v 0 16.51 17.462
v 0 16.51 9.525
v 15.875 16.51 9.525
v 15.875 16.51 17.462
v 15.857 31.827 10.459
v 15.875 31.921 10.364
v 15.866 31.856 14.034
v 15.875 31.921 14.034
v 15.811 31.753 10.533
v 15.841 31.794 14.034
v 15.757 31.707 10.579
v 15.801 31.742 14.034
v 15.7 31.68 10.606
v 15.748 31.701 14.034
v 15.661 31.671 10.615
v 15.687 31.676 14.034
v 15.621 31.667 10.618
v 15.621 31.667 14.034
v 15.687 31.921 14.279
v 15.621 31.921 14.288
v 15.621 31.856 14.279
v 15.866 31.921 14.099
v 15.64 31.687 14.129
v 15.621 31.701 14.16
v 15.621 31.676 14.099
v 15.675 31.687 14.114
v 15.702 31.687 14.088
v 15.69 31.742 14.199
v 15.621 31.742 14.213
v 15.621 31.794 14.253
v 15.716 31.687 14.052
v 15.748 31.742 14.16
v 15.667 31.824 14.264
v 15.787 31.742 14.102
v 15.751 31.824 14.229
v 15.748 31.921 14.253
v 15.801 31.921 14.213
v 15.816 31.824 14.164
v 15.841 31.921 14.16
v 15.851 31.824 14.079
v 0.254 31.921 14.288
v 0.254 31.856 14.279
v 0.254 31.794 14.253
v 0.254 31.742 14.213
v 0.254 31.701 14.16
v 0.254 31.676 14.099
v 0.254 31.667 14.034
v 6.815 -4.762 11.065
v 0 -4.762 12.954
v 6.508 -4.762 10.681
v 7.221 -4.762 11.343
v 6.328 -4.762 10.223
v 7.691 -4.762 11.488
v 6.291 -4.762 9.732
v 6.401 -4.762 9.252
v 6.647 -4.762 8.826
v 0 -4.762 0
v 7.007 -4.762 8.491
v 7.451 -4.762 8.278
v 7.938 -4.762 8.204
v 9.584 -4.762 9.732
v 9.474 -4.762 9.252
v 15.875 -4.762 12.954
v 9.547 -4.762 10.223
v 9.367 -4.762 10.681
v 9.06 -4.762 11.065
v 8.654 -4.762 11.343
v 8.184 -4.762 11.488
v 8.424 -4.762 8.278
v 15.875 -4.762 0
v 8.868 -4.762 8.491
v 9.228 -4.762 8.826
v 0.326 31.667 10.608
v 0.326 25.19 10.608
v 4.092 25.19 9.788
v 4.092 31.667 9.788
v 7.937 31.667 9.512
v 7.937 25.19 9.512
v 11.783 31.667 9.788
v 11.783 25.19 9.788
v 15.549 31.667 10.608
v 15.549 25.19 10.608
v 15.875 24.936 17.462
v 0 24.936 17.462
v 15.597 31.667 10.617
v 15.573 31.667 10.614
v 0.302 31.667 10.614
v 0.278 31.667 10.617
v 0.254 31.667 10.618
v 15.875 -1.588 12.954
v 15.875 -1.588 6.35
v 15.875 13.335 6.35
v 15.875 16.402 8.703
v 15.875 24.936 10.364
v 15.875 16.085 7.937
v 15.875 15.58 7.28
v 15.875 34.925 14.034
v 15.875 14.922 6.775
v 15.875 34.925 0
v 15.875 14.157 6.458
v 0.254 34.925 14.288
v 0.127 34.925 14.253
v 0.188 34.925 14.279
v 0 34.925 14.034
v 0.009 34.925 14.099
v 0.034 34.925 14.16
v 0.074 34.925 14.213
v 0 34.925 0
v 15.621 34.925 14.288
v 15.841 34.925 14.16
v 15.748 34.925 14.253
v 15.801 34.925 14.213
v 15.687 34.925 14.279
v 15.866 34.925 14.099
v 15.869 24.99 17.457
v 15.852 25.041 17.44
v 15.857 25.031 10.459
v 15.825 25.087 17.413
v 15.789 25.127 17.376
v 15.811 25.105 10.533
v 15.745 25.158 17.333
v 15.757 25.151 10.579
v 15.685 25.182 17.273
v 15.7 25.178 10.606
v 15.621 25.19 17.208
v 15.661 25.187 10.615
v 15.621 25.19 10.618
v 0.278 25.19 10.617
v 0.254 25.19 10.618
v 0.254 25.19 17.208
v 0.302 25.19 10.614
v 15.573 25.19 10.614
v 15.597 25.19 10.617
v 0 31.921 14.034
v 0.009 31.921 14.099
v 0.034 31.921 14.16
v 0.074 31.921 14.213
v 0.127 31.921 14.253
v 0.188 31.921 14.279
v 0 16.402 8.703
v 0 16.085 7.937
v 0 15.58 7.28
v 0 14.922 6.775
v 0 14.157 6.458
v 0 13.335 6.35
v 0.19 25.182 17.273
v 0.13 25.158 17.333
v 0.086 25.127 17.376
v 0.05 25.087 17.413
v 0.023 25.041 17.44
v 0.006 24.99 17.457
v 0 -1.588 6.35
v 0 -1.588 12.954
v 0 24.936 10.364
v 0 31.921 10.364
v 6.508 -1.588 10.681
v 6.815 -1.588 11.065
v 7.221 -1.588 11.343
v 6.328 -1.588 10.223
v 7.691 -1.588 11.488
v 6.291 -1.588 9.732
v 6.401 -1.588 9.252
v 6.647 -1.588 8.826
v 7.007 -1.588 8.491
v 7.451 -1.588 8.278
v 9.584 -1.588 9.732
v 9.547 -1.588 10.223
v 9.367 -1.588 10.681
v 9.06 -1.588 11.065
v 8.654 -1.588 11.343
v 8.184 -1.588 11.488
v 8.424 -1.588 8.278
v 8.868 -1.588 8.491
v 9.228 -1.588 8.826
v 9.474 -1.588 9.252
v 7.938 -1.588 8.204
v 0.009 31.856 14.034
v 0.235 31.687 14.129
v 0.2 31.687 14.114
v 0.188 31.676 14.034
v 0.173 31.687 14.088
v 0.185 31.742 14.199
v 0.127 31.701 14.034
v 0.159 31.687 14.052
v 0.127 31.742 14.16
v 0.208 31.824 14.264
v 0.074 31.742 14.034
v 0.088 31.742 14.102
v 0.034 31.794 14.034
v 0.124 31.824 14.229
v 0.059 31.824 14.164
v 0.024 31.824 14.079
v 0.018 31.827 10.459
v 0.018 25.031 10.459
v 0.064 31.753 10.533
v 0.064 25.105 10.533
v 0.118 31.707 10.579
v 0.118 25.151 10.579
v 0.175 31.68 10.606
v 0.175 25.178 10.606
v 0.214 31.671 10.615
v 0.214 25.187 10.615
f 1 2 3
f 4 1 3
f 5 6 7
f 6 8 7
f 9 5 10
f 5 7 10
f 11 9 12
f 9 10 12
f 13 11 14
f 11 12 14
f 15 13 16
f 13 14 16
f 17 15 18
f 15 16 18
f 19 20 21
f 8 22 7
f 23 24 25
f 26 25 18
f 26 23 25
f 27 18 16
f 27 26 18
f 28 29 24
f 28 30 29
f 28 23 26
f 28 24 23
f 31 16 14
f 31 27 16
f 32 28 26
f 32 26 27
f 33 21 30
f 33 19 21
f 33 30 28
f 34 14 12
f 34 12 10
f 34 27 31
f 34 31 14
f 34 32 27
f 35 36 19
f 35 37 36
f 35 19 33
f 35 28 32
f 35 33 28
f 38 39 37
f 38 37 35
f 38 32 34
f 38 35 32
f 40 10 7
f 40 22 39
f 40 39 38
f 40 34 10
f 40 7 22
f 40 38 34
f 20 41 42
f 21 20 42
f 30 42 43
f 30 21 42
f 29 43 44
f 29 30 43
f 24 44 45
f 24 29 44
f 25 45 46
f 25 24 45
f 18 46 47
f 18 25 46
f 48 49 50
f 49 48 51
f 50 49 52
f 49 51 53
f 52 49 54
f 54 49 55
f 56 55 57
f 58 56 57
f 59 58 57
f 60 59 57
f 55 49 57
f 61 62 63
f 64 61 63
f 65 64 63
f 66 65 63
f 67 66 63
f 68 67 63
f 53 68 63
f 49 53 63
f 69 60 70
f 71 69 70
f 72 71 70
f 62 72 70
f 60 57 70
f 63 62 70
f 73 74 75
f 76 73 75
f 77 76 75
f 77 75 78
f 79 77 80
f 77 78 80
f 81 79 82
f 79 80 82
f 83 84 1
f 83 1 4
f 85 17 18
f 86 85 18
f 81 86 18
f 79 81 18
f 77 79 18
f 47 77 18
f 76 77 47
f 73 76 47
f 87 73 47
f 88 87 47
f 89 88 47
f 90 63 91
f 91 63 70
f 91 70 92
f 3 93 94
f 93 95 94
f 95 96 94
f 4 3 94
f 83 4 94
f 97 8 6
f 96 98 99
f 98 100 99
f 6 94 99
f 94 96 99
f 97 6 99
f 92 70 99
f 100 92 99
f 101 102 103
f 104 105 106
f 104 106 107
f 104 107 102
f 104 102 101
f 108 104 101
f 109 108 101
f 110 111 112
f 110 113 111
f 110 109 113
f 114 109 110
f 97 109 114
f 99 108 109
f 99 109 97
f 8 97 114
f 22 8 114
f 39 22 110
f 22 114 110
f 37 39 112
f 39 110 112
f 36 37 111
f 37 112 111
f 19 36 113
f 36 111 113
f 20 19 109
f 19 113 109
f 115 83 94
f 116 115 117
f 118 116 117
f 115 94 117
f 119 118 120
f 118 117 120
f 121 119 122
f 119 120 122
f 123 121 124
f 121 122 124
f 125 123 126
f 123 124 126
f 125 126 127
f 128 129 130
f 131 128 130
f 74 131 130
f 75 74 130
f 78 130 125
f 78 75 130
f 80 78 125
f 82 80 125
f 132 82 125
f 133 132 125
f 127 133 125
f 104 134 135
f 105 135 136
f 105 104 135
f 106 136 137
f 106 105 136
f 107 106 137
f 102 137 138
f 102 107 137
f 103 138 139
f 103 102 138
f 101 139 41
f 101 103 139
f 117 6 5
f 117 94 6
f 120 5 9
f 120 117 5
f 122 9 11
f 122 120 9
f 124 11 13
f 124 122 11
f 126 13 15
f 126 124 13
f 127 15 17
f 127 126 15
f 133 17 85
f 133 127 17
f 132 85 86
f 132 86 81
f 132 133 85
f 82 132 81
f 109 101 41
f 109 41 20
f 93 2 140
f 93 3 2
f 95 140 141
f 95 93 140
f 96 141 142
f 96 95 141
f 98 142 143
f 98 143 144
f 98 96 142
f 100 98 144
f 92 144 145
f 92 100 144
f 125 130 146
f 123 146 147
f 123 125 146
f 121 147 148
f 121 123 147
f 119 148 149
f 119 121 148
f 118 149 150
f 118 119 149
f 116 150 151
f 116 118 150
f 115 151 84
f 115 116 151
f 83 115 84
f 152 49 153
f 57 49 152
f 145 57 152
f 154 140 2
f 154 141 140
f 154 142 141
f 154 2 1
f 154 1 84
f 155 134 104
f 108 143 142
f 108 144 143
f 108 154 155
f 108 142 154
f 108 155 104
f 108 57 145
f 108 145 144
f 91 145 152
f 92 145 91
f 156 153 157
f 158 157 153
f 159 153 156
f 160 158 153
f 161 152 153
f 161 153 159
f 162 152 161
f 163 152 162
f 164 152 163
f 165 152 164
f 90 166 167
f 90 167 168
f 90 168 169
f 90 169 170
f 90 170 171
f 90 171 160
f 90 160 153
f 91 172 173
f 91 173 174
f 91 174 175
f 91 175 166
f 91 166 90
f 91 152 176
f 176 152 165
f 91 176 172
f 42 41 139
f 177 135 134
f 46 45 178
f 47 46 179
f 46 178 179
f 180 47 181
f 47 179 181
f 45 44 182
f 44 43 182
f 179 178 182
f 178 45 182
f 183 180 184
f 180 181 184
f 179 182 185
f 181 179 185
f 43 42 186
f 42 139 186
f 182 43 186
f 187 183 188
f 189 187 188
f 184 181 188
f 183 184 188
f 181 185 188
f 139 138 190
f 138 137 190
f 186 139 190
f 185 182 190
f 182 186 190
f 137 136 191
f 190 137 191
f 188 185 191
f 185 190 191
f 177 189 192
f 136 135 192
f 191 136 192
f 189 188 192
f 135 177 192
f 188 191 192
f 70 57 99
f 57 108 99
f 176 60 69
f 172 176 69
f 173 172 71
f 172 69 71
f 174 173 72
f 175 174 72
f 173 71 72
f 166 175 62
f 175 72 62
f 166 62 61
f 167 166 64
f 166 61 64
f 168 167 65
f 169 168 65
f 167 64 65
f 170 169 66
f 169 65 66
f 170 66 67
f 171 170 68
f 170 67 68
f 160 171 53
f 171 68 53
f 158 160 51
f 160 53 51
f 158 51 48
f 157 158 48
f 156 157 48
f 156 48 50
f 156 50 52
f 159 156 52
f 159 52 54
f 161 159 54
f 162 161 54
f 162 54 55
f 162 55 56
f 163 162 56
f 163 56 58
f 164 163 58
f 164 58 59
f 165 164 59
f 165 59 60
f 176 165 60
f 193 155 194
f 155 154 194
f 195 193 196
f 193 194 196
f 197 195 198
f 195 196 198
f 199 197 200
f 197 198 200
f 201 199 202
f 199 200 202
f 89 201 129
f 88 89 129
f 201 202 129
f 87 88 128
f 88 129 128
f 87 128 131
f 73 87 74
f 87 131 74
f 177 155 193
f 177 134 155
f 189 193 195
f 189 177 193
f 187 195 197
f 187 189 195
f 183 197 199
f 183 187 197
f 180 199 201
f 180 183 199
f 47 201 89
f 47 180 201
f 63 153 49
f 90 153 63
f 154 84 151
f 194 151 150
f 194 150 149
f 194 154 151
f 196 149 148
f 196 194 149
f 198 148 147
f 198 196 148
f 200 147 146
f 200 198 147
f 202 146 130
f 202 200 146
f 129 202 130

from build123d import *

# Parameters (mm, degrees)
SKETCH1_W           = 15.875
SKETCH1_H           = 34.925
BOSS_EXTRUDE1_DEPTH = 6.35
SKETCH3_W           = 15.875
SKETCH3_H           = 18.415
BOSS_EXTRUDE2_DEPTH = 7.9375
SKETCH4_R           = 26.9875
CUT_EXTRUDE2_DEPTH  = 3.2385
SKETCH5_W           = 15.875
SKETCH5_H           = 8.68045
BOSS_EXTRUDE3_DEPTH = 3.175
FILLET1_R           = 0.254
FILLET2_R           = 3.175
SKETCH6_W           = 15.875
SKETCH6_H           = 6.35
BOSS_EXTRUDE4_DEPTH = 4.7625
SKETCH7_W           = 15.875
SKETCH7_H           = 3.175
BOSS_EXTRUDE5_DEPTH = 6.604
CUT_EXTRUDE3_REACH  = 48.174
SKETCH8_R           = 1.651


with BuildPart() as part:
    # Sketch1 → Boss-Extrude1 (new body)
    with BuildSketch(Plane.XY):
        with Locations((7.9375, 17.4625)):
            Rectangle(SKETCH1_W, SKETCH1_H)
    extrude(amount=BOSS_EXTRUDE1_DEPTH)

    # Sketch3 → Boss-Extrude2 (add)
    with BuildSketch(Plane.XY.offset(6.35)):
        with Locations((7.9375, 25.7175)):
            Rectangle(SKETCH3_W, SKETCH3_H)
    extrude(amount=BOSS_EXTRUDE2_DEPTH)

    # Sketch4 → Cut-Extrude2 (cut, symmetric)
    with BuildSketch(Plane(origin=(0, 28.42895, 0), x_dir=(-1, 0, 0), z_dir=(0, -1, 0))):
        with Locations((-7.9375, -36.4998)):
            Circle(SKETCH4_R)
    extrude(amount=CUT_EXTRUDE2_DEPTH, both=True, mode=Mode.SUBTRACT)

    # Sketch5 → Boss-Extrude3 (add)
    with BuildSketch(Plane.XY.offset(14.2875)):
        with Locations((7.9375, 20.850225)):
            Rectangle(SKETCH5_W, SKETCH5_H)
    extrude(amount=BOSS_EXTRUDE3_DEPTH)

    # Fillet1
    fillet1_edges = [part.edges().sort_by_distance(p)[0] for p in [
        (0, 33.296225, 14.2875),
        (15.875, 33.296225, 14.2875),
        (7.9375, 31.66745, 14.2875),
        (15.875, 28.42895, 10.705978065),
        (0, 28.42895, 10.705978065),
        (0, 25.19045, 14.084239033),
        (15.875, 25.19045, 14.084239033),
        (0, 31.66745, 12.496739033),
        (15.875, 31.66745, 12.496739033),
        (7.9375, 25.19045, 17.4625),
    ]]
    fillet(fillet1_edges, radius=FILLET1_R)

    # Fillet2
    fillet2_edges = [part.edges().sort_by_distance(p)[0] for p in [
        (7.9375, 16.51, 6.35),
    ]]
    fillet(fillet2_edges, radius=FILLET2_R)

    # Sketch6 → Boss-Extrude4 (add)
    with BuildSketch(Plane.XZ):
        with Locations((7.9375, 3.175)):
            Rectangle(SKETCH6_W, SKETCH6_H)
    extrude(amount=BOSS_EXTRUDE4_DEPTH)

    # Sketch7 → Boss-Extrude5 (add)
    with BuildSketch(Plane.XY.offset(6.35)):
        with Locations((7.9375, -3.175)):
            Rectangle(SKETCH7_W, SKETCH7_H)
    extrude(amount=BOSS_EXTRUDE5_DEPTH)

    # Sketch8 → Cut-Extrude3 (cut, up to next)
    with BuildSketch(Plane.XZ.offset(4.7625), mode=Mode.PRIVATE) as cut_extrude3_sk1:
        with Locations(Location((7.9375, 9.8552, 0), (0, 0, 270))):
            Circle(SKETCH8_R)
    cut_extrude3_tool1 = extrude(cut_extrude3_sk1.sketch, amount=-CUT_EXTRUDE3_REACH, mode=Mode.PRIVATE) & part.part
    add(cut_extrude3_tool1.solids().sort_by_distance((7.9375, -4.7625, 9.8552))[0], mode=Mode.SUBTRACT)


solid = part.part
